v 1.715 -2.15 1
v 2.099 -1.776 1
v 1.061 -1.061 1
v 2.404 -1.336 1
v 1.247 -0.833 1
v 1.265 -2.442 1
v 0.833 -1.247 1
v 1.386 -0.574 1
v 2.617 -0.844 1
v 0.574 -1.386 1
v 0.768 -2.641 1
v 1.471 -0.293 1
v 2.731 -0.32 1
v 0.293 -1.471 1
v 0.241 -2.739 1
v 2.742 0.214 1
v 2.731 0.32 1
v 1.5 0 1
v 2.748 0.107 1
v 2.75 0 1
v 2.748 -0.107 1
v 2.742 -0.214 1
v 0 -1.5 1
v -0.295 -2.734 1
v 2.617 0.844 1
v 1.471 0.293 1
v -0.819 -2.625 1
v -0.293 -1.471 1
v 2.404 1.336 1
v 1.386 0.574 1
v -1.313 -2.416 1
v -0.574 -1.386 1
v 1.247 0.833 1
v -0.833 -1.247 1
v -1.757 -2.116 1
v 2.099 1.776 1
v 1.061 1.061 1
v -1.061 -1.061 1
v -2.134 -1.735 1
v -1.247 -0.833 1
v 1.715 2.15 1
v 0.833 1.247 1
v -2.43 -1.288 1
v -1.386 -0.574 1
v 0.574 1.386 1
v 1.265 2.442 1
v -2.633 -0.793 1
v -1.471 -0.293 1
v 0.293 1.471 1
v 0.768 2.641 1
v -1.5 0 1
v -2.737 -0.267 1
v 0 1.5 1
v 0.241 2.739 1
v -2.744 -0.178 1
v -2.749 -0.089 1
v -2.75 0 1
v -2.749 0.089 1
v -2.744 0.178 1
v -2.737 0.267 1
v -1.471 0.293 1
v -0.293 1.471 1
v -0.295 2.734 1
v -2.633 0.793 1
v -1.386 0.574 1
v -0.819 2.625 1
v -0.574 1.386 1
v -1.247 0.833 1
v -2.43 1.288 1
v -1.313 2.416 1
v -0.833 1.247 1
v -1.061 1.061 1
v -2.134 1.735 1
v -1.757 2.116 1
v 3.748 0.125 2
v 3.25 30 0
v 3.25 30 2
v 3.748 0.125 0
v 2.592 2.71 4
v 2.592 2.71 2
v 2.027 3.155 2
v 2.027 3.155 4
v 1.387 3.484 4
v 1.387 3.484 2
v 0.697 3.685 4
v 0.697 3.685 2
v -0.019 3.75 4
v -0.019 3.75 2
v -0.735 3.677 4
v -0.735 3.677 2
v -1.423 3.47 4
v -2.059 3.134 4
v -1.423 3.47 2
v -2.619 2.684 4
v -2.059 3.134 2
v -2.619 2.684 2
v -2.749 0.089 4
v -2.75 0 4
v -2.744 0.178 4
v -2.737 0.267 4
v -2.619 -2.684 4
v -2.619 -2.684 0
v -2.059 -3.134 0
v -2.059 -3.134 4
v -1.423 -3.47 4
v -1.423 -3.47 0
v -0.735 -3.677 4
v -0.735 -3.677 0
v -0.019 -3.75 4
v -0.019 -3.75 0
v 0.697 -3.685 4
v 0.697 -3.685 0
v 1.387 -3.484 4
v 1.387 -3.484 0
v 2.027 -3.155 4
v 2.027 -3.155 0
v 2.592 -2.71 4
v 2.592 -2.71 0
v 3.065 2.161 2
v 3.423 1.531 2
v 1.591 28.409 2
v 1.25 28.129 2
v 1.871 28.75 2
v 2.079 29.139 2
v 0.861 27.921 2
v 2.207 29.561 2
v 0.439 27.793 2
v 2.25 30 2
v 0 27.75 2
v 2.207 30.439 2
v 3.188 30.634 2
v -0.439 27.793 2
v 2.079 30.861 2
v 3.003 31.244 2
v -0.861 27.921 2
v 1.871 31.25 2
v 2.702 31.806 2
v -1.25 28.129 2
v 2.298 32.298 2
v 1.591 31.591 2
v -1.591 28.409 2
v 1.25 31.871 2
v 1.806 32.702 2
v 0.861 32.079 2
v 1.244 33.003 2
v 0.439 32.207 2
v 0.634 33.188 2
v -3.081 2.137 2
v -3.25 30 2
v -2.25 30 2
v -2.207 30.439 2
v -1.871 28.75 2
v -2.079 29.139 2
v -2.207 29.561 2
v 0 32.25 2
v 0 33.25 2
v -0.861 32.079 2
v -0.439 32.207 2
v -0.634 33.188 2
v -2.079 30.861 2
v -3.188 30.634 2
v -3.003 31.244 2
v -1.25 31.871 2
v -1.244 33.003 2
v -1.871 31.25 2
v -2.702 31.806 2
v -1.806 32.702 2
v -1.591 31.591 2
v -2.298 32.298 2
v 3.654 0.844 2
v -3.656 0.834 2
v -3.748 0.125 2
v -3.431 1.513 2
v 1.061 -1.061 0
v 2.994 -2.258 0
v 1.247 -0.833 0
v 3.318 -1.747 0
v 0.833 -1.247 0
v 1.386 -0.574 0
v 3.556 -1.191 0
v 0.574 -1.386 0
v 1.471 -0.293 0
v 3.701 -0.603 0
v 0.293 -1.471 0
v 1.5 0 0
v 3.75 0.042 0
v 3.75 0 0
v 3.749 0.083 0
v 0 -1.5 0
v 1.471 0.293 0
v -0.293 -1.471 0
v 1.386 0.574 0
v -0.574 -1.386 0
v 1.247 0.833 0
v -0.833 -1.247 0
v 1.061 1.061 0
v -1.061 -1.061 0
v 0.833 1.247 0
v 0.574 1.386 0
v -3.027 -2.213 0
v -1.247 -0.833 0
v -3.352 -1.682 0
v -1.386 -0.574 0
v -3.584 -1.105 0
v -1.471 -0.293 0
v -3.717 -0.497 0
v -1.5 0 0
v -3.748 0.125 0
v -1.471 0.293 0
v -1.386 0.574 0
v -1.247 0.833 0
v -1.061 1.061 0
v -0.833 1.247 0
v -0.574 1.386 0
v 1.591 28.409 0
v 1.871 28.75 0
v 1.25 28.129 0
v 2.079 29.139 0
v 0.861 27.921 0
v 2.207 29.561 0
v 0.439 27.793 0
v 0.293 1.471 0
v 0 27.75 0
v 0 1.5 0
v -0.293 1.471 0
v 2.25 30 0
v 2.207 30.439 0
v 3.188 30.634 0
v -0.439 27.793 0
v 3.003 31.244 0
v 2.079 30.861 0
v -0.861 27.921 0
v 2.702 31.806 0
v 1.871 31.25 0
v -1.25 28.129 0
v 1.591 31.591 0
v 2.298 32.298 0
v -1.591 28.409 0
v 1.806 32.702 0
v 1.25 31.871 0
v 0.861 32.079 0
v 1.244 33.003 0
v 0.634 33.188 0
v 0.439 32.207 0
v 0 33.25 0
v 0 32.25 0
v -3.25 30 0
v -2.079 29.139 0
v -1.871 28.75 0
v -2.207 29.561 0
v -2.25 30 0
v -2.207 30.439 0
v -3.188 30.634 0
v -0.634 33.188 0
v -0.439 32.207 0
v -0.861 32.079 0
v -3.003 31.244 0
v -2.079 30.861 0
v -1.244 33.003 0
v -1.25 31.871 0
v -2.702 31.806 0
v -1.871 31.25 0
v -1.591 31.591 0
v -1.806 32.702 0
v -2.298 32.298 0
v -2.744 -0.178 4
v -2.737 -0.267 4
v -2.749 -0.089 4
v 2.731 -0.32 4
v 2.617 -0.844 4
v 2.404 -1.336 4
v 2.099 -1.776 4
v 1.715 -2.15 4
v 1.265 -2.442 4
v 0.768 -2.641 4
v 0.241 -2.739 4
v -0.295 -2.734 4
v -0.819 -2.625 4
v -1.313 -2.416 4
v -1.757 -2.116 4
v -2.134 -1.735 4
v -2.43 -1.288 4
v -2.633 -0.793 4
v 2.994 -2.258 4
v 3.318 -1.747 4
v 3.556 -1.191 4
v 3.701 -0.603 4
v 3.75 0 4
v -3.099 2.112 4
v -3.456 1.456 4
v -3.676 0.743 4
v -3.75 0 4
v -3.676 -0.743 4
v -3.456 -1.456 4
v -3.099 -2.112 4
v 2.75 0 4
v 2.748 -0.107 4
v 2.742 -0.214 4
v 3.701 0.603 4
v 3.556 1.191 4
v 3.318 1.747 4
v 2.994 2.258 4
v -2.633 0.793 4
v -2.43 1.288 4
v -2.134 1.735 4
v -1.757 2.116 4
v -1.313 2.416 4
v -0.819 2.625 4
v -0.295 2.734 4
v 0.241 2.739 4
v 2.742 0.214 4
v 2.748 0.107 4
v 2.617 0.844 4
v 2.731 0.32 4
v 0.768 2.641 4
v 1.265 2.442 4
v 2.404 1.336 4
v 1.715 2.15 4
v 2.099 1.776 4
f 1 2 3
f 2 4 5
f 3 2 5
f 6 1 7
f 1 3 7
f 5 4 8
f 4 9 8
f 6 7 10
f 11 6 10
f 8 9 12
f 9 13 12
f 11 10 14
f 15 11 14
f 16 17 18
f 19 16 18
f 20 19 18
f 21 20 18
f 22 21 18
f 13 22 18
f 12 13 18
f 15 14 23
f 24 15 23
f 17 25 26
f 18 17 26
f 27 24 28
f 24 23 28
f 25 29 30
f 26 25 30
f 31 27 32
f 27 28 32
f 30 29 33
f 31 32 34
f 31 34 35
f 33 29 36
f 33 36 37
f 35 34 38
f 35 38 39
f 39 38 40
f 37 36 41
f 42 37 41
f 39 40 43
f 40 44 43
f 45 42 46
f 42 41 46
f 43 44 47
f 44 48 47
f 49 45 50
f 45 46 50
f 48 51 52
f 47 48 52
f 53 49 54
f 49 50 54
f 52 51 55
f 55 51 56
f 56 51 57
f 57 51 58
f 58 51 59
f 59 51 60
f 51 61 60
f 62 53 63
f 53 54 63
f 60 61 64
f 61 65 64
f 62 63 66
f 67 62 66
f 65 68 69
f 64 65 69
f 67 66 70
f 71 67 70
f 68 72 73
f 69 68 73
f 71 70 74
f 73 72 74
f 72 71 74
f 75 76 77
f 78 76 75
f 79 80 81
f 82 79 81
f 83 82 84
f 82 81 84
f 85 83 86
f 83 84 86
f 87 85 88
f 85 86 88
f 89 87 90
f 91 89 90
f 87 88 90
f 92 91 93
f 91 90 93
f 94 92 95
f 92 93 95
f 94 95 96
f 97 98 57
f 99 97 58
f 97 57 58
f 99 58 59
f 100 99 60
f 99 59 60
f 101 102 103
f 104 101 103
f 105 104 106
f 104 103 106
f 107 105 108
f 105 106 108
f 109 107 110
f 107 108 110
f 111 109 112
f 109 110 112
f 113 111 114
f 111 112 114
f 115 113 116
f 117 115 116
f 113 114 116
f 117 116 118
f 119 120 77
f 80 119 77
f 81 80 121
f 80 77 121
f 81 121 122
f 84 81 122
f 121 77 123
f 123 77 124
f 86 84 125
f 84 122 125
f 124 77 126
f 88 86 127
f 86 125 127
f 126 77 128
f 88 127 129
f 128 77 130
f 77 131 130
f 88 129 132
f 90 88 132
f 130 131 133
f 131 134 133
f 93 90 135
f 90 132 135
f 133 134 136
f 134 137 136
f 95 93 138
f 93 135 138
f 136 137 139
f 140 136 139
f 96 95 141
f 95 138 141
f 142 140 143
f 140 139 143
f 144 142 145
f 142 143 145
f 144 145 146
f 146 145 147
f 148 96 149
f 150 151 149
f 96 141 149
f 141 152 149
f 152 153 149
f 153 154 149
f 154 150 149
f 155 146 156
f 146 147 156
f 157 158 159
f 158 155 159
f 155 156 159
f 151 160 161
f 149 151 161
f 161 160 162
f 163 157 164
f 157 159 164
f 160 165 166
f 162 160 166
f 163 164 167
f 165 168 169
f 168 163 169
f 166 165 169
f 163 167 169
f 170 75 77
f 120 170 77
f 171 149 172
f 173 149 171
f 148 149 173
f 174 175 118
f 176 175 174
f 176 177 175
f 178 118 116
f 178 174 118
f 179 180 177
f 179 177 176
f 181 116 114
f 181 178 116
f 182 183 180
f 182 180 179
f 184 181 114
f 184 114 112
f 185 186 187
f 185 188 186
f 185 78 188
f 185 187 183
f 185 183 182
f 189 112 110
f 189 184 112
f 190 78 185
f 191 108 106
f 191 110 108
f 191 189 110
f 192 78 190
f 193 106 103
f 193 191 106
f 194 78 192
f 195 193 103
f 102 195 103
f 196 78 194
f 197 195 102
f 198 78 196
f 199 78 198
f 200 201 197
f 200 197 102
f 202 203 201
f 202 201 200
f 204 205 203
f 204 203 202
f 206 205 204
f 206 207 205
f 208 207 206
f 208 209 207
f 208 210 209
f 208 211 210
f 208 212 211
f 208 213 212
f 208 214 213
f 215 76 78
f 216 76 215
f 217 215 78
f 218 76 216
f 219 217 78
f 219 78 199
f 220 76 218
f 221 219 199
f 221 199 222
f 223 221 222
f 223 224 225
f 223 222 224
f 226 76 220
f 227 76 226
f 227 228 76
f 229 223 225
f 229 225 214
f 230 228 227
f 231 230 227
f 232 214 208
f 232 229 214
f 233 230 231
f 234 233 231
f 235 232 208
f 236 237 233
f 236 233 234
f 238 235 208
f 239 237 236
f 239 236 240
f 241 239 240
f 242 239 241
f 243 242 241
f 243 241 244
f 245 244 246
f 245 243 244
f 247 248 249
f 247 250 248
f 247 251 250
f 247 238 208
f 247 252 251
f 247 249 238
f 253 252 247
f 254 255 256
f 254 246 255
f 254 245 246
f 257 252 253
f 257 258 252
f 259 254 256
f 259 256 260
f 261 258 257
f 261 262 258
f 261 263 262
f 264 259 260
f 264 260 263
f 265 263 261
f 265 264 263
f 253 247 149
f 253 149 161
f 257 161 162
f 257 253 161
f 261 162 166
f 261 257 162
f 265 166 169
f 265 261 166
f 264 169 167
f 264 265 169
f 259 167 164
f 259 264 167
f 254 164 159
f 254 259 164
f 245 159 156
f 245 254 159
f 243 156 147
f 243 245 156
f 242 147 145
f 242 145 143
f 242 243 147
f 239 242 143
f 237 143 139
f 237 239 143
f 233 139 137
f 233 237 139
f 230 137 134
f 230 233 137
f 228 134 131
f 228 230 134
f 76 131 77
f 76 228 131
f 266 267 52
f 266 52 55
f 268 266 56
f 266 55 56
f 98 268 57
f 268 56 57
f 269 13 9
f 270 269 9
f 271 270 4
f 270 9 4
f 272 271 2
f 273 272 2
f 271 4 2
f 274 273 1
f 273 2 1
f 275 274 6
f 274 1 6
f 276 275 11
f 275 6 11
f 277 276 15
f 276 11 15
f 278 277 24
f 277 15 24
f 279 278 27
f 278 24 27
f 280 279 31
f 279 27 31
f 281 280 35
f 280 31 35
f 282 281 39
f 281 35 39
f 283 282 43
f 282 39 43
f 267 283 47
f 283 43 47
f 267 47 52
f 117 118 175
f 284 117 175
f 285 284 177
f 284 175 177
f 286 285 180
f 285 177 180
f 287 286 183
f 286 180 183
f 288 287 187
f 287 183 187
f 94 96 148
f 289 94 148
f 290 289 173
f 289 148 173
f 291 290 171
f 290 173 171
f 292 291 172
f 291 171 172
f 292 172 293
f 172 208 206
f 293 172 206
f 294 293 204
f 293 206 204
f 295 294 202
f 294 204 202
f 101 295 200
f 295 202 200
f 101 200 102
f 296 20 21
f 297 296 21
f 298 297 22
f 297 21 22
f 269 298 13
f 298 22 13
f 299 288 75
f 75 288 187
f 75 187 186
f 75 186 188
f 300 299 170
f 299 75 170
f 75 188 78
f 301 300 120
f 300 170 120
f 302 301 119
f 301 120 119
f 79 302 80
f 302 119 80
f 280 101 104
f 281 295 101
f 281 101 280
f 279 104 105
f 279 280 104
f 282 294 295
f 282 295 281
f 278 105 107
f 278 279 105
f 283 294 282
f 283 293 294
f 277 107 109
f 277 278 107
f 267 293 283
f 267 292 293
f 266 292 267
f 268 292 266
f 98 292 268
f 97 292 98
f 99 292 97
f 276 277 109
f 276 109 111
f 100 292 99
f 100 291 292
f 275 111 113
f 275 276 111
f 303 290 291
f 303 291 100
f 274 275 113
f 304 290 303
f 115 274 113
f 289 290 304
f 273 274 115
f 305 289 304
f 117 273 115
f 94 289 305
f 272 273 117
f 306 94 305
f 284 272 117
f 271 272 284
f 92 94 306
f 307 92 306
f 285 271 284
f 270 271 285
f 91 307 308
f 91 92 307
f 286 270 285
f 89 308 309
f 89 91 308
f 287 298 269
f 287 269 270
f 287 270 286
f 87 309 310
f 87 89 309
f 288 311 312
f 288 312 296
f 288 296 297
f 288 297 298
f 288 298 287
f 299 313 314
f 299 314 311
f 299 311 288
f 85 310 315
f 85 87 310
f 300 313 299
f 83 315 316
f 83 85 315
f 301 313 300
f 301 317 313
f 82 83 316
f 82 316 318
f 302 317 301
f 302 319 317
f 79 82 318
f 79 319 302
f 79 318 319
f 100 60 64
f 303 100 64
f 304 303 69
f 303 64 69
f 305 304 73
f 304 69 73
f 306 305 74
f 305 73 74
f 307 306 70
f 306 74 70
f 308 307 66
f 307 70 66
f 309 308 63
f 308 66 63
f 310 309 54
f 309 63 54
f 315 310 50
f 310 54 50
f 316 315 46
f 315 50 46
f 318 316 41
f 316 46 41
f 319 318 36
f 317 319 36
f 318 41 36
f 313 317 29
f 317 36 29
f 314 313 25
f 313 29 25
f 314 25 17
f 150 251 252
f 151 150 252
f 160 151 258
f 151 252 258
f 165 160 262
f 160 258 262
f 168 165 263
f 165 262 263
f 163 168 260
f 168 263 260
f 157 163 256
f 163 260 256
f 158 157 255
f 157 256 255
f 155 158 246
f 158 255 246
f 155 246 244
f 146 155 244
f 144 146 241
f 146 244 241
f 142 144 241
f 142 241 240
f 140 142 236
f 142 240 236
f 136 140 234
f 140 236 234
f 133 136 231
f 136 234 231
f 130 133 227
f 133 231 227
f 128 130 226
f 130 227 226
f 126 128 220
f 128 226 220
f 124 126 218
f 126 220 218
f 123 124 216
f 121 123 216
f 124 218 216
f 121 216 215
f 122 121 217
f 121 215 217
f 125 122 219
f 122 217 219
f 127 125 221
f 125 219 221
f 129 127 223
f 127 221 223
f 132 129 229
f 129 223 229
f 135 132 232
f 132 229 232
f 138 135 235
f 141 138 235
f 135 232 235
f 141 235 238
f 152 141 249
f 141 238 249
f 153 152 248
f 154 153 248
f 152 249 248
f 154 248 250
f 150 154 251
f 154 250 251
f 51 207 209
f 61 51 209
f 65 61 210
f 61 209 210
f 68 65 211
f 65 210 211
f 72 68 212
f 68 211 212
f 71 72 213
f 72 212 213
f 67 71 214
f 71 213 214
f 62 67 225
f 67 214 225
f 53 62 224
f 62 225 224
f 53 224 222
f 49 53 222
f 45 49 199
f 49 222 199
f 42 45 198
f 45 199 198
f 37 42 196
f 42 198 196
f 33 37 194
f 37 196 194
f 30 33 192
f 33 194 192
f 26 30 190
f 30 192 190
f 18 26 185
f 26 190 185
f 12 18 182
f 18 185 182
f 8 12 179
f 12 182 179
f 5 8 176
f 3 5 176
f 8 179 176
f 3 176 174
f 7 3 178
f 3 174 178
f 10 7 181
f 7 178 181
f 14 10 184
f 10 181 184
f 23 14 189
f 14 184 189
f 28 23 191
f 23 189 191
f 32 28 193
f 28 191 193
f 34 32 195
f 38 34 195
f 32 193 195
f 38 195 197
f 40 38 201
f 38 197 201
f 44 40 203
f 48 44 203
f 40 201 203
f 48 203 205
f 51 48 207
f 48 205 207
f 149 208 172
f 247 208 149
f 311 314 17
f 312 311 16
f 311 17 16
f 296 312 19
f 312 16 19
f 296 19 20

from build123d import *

# Parameters (mm, degrees)
ESQUISSE1_R         = 3.75
ESQUISSE1_R_2       = 2.75
BOSS_EXTRU_1_DEPTH  = 4
SKETCH1_R           = 2.25
BOSS_EXTRUDE1_DEPTH = 2
SKETCH1_3_R         = 2.75
SKETCH1_3_R_2       = 1.5
BOSS_EXTRUDE2_DEPTH = 1


with BuildPart() as part:
    # Esquisse1 → Boss.-Extru.1 (new body)
    with BuildSketch(Plane.XY):
        Circle(ESQUISSE1_R)
        Circle(ESQUISSE1_R_2, mode=Mode.SUBTRACT)
    extrude(amount=BOSS_EXTRU_1_DEPTH)

    # Sketch1 → Boss-Extrude1 (add)
    with BuildSketch(Plane(origin=(0, 0, 0), x_dir=(-1, 0, 0), z_dir=(0, 0, -1))):
        with BuildLine():
            Line((3.747917245, 0.124965287), (3.25, 30))
            ThreePointArc((3.25, 30), (0, 33.25), (-3.25, 30))
            Line((-3.25, 30), (-3.747917245, 0.124965287))
            ThreePointArc((-3.747917245, 0.124965287), (0, 3.75), (3.747917245, 0.124965287))
        make_face()
        with Locations((0, 30)):
            Circle(SKETCH1_R, mode=Mode.SUBTRACT)
    extrude(amount=-BOSS_EXTRUDE1_DEPTH)

    # Sketch1<3> → Boss-Extrude2 (add)
    with BuildSketch(Plane(origin=(0, 0, 0), x_dir=(-1, 0, 0), z_dir=(0, 0, -1))):
        Circle(SKETCH1_3_R)
        Circle(SKETCH1_3_R_2, mode=Mode.SUBTRACT)
    extrude(amount=-BOSS_EXTRUDE2_DEPTH)


solid = part.part
